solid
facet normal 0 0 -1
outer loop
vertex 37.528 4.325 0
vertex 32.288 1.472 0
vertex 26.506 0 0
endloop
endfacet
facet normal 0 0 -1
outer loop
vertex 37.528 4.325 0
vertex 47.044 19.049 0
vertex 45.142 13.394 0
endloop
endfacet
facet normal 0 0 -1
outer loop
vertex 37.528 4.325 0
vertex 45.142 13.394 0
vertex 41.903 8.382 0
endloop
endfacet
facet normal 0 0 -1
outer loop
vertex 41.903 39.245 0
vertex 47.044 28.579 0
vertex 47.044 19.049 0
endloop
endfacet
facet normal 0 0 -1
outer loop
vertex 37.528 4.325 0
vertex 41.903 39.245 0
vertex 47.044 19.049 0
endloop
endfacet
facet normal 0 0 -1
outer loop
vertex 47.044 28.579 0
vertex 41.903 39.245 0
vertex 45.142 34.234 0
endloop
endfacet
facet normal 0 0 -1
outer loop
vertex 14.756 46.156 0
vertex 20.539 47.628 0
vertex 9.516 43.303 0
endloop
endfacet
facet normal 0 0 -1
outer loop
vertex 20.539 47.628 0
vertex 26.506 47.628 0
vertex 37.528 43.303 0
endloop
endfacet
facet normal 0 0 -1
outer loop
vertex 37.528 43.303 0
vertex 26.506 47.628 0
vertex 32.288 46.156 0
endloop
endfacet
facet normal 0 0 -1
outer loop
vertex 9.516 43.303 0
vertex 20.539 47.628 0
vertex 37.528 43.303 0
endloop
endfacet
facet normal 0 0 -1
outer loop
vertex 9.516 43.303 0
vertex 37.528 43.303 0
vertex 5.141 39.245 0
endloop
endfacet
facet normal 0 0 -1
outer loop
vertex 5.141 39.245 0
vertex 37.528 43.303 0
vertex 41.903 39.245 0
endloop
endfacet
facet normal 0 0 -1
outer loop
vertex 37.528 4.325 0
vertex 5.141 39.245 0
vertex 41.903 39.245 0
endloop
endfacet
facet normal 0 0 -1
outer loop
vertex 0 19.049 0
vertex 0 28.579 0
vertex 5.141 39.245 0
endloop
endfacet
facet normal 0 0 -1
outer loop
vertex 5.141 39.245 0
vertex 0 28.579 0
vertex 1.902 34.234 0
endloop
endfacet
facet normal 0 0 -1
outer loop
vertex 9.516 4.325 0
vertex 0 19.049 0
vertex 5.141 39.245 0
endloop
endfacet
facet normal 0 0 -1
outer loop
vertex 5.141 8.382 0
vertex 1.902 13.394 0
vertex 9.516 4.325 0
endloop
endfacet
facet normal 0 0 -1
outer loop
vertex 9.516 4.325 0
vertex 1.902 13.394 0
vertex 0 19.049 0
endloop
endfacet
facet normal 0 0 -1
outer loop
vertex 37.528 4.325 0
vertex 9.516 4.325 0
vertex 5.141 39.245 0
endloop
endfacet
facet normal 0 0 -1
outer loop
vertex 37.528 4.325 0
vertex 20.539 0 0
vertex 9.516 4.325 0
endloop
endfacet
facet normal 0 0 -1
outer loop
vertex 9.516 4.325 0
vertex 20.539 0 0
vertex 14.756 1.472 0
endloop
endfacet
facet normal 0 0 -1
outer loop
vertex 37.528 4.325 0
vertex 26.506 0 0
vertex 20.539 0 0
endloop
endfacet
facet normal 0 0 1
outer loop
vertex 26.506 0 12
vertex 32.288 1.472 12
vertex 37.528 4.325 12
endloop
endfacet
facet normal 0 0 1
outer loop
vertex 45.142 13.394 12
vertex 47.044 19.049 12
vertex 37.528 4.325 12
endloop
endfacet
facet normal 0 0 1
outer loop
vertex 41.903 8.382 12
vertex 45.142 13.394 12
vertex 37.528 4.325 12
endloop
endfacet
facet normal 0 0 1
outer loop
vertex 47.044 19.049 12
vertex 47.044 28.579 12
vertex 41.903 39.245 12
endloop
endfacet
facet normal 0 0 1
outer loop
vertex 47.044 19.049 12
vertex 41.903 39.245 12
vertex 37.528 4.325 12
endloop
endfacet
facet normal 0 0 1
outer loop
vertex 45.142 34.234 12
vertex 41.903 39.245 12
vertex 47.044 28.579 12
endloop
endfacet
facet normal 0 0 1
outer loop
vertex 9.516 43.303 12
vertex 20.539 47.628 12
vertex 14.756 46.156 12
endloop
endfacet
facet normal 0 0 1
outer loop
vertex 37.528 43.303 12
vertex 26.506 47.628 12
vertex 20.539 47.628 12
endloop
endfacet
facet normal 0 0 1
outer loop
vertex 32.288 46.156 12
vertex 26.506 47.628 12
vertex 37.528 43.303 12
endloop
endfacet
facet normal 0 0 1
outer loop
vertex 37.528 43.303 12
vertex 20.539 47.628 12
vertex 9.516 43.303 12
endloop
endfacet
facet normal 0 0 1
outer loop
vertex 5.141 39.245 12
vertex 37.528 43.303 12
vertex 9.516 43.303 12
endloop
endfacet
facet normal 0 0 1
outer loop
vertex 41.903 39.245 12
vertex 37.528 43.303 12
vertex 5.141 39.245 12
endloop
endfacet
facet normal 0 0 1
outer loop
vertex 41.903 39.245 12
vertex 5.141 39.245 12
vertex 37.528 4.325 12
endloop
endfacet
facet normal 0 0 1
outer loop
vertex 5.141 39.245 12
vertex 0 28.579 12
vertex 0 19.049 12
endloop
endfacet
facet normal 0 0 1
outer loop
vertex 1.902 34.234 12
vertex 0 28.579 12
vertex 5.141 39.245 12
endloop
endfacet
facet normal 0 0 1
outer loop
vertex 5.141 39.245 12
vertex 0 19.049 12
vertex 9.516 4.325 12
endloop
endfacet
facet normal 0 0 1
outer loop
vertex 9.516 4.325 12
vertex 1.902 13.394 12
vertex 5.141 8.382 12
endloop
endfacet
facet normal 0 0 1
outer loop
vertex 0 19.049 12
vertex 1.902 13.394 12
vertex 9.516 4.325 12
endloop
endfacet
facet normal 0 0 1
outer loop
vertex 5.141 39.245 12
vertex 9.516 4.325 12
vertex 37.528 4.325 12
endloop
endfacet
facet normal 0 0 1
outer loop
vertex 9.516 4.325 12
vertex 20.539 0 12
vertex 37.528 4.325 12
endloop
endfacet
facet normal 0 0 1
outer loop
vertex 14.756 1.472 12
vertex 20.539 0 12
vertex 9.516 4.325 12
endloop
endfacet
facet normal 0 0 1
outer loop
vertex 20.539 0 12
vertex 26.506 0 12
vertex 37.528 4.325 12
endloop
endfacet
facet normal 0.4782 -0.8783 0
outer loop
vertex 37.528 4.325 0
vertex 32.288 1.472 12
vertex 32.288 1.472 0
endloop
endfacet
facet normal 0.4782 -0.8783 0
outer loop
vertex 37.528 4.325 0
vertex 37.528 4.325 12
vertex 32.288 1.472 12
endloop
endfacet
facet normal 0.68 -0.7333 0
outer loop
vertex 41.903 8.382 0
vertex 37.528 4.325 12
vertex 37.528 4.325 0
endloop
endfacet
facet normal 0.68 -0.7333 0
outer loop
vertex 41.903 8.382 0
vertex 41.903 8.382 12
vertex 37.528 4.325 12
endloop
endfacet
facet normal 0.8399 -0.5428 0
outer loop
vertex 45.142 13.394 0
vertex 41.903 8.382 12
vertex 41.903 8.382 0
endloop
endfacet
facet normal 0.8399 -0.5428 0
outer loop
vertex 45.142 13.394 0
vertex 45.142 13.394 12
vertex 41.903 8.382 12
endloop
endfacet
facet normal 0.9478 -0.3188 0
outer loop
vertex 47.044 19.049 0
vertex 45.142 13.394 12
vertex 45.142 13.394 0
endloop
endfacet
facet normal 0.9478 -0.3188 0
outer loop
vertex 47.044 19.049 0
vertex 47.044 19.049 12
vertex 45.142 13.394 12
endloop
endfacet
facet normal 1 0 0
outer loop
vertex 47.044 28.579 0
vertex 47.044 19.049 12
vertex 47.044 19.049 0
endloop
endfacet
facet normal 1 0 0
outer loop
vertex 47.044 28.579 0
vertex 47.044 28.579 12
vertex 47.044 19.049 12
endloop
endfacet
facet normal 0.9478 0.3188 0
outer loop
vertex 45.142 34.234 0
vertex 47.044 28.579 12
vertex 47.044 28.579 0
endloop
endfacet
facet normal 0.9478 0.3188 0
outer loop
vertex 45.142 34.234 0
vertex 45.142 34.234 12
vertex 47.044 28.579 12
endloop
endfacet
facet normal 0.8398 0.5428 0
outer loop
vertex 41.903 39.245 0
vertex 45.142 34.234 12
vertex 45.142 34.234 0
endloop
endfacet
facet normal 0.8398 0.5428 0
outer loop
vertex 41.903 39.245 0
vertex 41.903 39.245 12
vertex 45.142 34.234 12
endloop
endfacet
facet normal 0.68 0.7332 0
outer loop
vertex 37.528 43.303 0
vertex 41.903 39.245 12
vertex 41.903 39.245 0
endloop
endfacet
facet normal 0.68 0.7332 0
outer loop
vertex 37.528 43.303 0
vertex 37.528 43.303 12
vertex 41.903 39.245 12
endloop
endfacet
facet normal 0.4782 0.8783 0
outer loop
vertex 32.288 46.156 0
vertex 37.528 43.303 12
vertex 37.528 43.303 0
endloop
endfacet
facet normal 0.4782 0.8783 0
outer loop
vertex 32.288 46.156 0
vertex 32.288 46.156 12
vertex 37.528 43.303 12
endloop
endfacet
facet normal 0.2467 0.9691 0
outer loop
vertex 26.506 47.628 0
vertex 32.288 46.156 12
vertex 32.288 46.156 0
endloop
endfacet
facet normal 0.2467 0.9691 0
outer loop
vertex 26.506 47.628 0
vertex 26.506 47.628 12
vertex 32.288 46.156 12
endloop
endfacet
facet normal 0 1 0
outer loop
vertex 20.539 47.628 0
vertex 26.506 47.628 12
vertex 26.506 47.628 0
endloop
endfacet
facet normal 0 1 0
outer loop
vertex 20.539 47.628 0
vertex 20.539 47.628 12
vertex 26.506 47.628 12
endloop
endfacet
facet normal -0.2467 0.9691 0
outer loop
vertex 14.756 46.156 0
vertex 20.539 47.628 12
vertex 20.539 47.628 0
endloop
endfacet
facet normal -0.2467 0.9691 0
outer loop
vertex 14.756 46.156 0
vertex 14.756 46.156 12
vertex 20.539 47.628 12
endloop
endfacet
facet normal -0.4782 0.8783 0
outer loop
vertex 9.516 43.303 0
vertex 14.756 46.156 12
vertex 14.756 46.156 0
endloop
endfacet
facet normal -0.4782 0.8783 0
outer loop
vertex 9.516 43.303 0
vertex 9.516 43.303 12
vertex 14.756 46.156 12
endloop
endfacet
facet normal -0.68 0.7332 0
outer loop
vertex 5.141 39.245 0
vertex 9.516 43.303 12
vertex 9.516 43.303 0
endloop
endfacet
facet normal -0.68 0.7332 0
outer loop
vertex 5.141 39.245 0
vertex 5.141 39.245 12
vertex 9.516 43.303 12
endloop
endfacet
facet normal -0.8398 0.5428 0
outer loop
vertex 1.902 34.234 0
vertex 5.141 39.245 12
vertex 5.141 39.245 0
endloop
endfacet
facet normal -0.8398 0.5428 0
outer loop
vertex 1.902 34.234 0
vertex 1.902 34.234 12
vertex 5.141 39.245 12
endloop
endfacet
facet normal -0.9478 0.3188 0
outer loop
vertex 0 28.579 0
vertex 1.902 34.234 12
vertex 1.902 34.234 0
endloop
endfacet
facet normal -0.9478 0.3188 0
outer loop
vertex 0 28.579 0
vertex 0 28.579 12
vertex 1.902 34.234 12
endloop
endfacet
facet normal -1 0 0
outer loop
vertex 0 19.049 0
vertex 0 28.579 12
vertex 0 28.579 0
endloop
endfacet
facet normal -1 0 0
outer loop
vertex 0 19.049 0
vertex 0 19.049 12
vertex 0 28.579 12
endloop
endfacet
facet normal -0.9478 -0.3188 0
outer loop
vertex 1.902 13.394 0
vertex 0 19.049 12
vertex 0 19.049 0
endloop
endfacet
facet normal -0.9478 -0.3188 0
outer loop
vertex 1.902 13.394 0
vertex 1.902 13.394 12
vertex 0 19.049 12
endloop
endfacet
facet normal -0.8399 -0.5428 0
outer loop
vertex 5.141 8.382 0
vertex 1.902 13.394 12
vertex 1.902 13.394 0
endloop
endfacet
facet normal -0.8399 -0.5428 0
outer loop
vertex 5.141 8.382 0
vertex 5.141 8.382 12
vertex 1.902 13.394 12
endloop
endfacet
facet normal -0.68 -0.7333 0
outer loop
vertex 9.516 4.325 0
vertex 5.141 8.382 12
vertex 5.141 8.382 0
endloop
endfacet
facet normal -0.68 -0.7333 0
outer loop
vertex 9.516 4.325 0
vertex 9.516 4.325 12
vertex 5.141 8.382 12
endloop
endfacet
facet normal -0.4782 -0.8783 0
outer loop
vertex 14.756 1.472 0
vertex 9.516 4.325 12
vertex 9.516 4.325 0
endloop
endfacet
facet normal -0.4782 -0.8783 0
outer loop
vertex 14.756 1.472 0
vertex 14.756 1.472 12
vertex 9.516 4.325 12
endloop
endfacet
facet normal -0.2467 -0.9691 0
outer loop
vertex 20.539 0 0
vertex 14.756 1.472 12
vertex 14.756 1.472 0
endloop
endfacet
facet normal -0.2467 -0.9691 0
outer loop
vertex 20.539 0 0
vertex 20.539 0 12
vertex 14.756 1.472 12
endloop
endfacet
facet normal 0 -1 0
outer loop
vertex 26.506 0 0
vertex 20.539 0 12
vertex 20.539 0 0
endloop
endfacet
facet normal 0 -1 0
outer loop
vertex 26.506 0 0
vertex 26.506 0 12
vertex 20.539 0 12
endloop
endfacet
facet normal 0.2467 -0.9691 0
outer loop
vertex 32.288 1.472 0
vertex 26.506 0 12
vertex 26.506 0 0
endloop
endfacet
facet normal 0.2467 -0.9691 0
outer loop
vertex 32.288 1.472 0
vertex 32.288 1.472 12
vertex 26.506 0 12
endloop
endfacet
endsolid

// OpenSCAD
$fn = 32;

// ----------------------------------------------------------------------
// Flat adaptor: double_d, 12 mm thick
// ----------------------------------------------------------------------

// --- parameters (mm) ---
profile_height = 12;      // extrusion height
profile_points = 24;      // points of the closed outline

profile = [[47.044, 28.579], [45.142, 34.234], [41.903, 39.245], [37.528, 43.303], [32.288, 46.156], [26.506, 47.628], [20.539, 47.628], [14.756, 46.156], [9.516, 43.303], [5.141, 39.245], [1.902, 34.234], [0, 28.579], [0, 19.049], [1.902, 13.394], [5.141, 8.382], [9.516, 4.325], [14.756, 1.472], [20.539, 0], [26.506, 0], [32.288, 1.472], [37.528, 4.325], [41.903, 8.382], [45.142, 13.394], [47.044, 19.049]];  // single closed polygon, 24 points, counter clockwise

// --- the one profile operation ---
linear_extrude(height = profile_height) polygon(points = profile);
